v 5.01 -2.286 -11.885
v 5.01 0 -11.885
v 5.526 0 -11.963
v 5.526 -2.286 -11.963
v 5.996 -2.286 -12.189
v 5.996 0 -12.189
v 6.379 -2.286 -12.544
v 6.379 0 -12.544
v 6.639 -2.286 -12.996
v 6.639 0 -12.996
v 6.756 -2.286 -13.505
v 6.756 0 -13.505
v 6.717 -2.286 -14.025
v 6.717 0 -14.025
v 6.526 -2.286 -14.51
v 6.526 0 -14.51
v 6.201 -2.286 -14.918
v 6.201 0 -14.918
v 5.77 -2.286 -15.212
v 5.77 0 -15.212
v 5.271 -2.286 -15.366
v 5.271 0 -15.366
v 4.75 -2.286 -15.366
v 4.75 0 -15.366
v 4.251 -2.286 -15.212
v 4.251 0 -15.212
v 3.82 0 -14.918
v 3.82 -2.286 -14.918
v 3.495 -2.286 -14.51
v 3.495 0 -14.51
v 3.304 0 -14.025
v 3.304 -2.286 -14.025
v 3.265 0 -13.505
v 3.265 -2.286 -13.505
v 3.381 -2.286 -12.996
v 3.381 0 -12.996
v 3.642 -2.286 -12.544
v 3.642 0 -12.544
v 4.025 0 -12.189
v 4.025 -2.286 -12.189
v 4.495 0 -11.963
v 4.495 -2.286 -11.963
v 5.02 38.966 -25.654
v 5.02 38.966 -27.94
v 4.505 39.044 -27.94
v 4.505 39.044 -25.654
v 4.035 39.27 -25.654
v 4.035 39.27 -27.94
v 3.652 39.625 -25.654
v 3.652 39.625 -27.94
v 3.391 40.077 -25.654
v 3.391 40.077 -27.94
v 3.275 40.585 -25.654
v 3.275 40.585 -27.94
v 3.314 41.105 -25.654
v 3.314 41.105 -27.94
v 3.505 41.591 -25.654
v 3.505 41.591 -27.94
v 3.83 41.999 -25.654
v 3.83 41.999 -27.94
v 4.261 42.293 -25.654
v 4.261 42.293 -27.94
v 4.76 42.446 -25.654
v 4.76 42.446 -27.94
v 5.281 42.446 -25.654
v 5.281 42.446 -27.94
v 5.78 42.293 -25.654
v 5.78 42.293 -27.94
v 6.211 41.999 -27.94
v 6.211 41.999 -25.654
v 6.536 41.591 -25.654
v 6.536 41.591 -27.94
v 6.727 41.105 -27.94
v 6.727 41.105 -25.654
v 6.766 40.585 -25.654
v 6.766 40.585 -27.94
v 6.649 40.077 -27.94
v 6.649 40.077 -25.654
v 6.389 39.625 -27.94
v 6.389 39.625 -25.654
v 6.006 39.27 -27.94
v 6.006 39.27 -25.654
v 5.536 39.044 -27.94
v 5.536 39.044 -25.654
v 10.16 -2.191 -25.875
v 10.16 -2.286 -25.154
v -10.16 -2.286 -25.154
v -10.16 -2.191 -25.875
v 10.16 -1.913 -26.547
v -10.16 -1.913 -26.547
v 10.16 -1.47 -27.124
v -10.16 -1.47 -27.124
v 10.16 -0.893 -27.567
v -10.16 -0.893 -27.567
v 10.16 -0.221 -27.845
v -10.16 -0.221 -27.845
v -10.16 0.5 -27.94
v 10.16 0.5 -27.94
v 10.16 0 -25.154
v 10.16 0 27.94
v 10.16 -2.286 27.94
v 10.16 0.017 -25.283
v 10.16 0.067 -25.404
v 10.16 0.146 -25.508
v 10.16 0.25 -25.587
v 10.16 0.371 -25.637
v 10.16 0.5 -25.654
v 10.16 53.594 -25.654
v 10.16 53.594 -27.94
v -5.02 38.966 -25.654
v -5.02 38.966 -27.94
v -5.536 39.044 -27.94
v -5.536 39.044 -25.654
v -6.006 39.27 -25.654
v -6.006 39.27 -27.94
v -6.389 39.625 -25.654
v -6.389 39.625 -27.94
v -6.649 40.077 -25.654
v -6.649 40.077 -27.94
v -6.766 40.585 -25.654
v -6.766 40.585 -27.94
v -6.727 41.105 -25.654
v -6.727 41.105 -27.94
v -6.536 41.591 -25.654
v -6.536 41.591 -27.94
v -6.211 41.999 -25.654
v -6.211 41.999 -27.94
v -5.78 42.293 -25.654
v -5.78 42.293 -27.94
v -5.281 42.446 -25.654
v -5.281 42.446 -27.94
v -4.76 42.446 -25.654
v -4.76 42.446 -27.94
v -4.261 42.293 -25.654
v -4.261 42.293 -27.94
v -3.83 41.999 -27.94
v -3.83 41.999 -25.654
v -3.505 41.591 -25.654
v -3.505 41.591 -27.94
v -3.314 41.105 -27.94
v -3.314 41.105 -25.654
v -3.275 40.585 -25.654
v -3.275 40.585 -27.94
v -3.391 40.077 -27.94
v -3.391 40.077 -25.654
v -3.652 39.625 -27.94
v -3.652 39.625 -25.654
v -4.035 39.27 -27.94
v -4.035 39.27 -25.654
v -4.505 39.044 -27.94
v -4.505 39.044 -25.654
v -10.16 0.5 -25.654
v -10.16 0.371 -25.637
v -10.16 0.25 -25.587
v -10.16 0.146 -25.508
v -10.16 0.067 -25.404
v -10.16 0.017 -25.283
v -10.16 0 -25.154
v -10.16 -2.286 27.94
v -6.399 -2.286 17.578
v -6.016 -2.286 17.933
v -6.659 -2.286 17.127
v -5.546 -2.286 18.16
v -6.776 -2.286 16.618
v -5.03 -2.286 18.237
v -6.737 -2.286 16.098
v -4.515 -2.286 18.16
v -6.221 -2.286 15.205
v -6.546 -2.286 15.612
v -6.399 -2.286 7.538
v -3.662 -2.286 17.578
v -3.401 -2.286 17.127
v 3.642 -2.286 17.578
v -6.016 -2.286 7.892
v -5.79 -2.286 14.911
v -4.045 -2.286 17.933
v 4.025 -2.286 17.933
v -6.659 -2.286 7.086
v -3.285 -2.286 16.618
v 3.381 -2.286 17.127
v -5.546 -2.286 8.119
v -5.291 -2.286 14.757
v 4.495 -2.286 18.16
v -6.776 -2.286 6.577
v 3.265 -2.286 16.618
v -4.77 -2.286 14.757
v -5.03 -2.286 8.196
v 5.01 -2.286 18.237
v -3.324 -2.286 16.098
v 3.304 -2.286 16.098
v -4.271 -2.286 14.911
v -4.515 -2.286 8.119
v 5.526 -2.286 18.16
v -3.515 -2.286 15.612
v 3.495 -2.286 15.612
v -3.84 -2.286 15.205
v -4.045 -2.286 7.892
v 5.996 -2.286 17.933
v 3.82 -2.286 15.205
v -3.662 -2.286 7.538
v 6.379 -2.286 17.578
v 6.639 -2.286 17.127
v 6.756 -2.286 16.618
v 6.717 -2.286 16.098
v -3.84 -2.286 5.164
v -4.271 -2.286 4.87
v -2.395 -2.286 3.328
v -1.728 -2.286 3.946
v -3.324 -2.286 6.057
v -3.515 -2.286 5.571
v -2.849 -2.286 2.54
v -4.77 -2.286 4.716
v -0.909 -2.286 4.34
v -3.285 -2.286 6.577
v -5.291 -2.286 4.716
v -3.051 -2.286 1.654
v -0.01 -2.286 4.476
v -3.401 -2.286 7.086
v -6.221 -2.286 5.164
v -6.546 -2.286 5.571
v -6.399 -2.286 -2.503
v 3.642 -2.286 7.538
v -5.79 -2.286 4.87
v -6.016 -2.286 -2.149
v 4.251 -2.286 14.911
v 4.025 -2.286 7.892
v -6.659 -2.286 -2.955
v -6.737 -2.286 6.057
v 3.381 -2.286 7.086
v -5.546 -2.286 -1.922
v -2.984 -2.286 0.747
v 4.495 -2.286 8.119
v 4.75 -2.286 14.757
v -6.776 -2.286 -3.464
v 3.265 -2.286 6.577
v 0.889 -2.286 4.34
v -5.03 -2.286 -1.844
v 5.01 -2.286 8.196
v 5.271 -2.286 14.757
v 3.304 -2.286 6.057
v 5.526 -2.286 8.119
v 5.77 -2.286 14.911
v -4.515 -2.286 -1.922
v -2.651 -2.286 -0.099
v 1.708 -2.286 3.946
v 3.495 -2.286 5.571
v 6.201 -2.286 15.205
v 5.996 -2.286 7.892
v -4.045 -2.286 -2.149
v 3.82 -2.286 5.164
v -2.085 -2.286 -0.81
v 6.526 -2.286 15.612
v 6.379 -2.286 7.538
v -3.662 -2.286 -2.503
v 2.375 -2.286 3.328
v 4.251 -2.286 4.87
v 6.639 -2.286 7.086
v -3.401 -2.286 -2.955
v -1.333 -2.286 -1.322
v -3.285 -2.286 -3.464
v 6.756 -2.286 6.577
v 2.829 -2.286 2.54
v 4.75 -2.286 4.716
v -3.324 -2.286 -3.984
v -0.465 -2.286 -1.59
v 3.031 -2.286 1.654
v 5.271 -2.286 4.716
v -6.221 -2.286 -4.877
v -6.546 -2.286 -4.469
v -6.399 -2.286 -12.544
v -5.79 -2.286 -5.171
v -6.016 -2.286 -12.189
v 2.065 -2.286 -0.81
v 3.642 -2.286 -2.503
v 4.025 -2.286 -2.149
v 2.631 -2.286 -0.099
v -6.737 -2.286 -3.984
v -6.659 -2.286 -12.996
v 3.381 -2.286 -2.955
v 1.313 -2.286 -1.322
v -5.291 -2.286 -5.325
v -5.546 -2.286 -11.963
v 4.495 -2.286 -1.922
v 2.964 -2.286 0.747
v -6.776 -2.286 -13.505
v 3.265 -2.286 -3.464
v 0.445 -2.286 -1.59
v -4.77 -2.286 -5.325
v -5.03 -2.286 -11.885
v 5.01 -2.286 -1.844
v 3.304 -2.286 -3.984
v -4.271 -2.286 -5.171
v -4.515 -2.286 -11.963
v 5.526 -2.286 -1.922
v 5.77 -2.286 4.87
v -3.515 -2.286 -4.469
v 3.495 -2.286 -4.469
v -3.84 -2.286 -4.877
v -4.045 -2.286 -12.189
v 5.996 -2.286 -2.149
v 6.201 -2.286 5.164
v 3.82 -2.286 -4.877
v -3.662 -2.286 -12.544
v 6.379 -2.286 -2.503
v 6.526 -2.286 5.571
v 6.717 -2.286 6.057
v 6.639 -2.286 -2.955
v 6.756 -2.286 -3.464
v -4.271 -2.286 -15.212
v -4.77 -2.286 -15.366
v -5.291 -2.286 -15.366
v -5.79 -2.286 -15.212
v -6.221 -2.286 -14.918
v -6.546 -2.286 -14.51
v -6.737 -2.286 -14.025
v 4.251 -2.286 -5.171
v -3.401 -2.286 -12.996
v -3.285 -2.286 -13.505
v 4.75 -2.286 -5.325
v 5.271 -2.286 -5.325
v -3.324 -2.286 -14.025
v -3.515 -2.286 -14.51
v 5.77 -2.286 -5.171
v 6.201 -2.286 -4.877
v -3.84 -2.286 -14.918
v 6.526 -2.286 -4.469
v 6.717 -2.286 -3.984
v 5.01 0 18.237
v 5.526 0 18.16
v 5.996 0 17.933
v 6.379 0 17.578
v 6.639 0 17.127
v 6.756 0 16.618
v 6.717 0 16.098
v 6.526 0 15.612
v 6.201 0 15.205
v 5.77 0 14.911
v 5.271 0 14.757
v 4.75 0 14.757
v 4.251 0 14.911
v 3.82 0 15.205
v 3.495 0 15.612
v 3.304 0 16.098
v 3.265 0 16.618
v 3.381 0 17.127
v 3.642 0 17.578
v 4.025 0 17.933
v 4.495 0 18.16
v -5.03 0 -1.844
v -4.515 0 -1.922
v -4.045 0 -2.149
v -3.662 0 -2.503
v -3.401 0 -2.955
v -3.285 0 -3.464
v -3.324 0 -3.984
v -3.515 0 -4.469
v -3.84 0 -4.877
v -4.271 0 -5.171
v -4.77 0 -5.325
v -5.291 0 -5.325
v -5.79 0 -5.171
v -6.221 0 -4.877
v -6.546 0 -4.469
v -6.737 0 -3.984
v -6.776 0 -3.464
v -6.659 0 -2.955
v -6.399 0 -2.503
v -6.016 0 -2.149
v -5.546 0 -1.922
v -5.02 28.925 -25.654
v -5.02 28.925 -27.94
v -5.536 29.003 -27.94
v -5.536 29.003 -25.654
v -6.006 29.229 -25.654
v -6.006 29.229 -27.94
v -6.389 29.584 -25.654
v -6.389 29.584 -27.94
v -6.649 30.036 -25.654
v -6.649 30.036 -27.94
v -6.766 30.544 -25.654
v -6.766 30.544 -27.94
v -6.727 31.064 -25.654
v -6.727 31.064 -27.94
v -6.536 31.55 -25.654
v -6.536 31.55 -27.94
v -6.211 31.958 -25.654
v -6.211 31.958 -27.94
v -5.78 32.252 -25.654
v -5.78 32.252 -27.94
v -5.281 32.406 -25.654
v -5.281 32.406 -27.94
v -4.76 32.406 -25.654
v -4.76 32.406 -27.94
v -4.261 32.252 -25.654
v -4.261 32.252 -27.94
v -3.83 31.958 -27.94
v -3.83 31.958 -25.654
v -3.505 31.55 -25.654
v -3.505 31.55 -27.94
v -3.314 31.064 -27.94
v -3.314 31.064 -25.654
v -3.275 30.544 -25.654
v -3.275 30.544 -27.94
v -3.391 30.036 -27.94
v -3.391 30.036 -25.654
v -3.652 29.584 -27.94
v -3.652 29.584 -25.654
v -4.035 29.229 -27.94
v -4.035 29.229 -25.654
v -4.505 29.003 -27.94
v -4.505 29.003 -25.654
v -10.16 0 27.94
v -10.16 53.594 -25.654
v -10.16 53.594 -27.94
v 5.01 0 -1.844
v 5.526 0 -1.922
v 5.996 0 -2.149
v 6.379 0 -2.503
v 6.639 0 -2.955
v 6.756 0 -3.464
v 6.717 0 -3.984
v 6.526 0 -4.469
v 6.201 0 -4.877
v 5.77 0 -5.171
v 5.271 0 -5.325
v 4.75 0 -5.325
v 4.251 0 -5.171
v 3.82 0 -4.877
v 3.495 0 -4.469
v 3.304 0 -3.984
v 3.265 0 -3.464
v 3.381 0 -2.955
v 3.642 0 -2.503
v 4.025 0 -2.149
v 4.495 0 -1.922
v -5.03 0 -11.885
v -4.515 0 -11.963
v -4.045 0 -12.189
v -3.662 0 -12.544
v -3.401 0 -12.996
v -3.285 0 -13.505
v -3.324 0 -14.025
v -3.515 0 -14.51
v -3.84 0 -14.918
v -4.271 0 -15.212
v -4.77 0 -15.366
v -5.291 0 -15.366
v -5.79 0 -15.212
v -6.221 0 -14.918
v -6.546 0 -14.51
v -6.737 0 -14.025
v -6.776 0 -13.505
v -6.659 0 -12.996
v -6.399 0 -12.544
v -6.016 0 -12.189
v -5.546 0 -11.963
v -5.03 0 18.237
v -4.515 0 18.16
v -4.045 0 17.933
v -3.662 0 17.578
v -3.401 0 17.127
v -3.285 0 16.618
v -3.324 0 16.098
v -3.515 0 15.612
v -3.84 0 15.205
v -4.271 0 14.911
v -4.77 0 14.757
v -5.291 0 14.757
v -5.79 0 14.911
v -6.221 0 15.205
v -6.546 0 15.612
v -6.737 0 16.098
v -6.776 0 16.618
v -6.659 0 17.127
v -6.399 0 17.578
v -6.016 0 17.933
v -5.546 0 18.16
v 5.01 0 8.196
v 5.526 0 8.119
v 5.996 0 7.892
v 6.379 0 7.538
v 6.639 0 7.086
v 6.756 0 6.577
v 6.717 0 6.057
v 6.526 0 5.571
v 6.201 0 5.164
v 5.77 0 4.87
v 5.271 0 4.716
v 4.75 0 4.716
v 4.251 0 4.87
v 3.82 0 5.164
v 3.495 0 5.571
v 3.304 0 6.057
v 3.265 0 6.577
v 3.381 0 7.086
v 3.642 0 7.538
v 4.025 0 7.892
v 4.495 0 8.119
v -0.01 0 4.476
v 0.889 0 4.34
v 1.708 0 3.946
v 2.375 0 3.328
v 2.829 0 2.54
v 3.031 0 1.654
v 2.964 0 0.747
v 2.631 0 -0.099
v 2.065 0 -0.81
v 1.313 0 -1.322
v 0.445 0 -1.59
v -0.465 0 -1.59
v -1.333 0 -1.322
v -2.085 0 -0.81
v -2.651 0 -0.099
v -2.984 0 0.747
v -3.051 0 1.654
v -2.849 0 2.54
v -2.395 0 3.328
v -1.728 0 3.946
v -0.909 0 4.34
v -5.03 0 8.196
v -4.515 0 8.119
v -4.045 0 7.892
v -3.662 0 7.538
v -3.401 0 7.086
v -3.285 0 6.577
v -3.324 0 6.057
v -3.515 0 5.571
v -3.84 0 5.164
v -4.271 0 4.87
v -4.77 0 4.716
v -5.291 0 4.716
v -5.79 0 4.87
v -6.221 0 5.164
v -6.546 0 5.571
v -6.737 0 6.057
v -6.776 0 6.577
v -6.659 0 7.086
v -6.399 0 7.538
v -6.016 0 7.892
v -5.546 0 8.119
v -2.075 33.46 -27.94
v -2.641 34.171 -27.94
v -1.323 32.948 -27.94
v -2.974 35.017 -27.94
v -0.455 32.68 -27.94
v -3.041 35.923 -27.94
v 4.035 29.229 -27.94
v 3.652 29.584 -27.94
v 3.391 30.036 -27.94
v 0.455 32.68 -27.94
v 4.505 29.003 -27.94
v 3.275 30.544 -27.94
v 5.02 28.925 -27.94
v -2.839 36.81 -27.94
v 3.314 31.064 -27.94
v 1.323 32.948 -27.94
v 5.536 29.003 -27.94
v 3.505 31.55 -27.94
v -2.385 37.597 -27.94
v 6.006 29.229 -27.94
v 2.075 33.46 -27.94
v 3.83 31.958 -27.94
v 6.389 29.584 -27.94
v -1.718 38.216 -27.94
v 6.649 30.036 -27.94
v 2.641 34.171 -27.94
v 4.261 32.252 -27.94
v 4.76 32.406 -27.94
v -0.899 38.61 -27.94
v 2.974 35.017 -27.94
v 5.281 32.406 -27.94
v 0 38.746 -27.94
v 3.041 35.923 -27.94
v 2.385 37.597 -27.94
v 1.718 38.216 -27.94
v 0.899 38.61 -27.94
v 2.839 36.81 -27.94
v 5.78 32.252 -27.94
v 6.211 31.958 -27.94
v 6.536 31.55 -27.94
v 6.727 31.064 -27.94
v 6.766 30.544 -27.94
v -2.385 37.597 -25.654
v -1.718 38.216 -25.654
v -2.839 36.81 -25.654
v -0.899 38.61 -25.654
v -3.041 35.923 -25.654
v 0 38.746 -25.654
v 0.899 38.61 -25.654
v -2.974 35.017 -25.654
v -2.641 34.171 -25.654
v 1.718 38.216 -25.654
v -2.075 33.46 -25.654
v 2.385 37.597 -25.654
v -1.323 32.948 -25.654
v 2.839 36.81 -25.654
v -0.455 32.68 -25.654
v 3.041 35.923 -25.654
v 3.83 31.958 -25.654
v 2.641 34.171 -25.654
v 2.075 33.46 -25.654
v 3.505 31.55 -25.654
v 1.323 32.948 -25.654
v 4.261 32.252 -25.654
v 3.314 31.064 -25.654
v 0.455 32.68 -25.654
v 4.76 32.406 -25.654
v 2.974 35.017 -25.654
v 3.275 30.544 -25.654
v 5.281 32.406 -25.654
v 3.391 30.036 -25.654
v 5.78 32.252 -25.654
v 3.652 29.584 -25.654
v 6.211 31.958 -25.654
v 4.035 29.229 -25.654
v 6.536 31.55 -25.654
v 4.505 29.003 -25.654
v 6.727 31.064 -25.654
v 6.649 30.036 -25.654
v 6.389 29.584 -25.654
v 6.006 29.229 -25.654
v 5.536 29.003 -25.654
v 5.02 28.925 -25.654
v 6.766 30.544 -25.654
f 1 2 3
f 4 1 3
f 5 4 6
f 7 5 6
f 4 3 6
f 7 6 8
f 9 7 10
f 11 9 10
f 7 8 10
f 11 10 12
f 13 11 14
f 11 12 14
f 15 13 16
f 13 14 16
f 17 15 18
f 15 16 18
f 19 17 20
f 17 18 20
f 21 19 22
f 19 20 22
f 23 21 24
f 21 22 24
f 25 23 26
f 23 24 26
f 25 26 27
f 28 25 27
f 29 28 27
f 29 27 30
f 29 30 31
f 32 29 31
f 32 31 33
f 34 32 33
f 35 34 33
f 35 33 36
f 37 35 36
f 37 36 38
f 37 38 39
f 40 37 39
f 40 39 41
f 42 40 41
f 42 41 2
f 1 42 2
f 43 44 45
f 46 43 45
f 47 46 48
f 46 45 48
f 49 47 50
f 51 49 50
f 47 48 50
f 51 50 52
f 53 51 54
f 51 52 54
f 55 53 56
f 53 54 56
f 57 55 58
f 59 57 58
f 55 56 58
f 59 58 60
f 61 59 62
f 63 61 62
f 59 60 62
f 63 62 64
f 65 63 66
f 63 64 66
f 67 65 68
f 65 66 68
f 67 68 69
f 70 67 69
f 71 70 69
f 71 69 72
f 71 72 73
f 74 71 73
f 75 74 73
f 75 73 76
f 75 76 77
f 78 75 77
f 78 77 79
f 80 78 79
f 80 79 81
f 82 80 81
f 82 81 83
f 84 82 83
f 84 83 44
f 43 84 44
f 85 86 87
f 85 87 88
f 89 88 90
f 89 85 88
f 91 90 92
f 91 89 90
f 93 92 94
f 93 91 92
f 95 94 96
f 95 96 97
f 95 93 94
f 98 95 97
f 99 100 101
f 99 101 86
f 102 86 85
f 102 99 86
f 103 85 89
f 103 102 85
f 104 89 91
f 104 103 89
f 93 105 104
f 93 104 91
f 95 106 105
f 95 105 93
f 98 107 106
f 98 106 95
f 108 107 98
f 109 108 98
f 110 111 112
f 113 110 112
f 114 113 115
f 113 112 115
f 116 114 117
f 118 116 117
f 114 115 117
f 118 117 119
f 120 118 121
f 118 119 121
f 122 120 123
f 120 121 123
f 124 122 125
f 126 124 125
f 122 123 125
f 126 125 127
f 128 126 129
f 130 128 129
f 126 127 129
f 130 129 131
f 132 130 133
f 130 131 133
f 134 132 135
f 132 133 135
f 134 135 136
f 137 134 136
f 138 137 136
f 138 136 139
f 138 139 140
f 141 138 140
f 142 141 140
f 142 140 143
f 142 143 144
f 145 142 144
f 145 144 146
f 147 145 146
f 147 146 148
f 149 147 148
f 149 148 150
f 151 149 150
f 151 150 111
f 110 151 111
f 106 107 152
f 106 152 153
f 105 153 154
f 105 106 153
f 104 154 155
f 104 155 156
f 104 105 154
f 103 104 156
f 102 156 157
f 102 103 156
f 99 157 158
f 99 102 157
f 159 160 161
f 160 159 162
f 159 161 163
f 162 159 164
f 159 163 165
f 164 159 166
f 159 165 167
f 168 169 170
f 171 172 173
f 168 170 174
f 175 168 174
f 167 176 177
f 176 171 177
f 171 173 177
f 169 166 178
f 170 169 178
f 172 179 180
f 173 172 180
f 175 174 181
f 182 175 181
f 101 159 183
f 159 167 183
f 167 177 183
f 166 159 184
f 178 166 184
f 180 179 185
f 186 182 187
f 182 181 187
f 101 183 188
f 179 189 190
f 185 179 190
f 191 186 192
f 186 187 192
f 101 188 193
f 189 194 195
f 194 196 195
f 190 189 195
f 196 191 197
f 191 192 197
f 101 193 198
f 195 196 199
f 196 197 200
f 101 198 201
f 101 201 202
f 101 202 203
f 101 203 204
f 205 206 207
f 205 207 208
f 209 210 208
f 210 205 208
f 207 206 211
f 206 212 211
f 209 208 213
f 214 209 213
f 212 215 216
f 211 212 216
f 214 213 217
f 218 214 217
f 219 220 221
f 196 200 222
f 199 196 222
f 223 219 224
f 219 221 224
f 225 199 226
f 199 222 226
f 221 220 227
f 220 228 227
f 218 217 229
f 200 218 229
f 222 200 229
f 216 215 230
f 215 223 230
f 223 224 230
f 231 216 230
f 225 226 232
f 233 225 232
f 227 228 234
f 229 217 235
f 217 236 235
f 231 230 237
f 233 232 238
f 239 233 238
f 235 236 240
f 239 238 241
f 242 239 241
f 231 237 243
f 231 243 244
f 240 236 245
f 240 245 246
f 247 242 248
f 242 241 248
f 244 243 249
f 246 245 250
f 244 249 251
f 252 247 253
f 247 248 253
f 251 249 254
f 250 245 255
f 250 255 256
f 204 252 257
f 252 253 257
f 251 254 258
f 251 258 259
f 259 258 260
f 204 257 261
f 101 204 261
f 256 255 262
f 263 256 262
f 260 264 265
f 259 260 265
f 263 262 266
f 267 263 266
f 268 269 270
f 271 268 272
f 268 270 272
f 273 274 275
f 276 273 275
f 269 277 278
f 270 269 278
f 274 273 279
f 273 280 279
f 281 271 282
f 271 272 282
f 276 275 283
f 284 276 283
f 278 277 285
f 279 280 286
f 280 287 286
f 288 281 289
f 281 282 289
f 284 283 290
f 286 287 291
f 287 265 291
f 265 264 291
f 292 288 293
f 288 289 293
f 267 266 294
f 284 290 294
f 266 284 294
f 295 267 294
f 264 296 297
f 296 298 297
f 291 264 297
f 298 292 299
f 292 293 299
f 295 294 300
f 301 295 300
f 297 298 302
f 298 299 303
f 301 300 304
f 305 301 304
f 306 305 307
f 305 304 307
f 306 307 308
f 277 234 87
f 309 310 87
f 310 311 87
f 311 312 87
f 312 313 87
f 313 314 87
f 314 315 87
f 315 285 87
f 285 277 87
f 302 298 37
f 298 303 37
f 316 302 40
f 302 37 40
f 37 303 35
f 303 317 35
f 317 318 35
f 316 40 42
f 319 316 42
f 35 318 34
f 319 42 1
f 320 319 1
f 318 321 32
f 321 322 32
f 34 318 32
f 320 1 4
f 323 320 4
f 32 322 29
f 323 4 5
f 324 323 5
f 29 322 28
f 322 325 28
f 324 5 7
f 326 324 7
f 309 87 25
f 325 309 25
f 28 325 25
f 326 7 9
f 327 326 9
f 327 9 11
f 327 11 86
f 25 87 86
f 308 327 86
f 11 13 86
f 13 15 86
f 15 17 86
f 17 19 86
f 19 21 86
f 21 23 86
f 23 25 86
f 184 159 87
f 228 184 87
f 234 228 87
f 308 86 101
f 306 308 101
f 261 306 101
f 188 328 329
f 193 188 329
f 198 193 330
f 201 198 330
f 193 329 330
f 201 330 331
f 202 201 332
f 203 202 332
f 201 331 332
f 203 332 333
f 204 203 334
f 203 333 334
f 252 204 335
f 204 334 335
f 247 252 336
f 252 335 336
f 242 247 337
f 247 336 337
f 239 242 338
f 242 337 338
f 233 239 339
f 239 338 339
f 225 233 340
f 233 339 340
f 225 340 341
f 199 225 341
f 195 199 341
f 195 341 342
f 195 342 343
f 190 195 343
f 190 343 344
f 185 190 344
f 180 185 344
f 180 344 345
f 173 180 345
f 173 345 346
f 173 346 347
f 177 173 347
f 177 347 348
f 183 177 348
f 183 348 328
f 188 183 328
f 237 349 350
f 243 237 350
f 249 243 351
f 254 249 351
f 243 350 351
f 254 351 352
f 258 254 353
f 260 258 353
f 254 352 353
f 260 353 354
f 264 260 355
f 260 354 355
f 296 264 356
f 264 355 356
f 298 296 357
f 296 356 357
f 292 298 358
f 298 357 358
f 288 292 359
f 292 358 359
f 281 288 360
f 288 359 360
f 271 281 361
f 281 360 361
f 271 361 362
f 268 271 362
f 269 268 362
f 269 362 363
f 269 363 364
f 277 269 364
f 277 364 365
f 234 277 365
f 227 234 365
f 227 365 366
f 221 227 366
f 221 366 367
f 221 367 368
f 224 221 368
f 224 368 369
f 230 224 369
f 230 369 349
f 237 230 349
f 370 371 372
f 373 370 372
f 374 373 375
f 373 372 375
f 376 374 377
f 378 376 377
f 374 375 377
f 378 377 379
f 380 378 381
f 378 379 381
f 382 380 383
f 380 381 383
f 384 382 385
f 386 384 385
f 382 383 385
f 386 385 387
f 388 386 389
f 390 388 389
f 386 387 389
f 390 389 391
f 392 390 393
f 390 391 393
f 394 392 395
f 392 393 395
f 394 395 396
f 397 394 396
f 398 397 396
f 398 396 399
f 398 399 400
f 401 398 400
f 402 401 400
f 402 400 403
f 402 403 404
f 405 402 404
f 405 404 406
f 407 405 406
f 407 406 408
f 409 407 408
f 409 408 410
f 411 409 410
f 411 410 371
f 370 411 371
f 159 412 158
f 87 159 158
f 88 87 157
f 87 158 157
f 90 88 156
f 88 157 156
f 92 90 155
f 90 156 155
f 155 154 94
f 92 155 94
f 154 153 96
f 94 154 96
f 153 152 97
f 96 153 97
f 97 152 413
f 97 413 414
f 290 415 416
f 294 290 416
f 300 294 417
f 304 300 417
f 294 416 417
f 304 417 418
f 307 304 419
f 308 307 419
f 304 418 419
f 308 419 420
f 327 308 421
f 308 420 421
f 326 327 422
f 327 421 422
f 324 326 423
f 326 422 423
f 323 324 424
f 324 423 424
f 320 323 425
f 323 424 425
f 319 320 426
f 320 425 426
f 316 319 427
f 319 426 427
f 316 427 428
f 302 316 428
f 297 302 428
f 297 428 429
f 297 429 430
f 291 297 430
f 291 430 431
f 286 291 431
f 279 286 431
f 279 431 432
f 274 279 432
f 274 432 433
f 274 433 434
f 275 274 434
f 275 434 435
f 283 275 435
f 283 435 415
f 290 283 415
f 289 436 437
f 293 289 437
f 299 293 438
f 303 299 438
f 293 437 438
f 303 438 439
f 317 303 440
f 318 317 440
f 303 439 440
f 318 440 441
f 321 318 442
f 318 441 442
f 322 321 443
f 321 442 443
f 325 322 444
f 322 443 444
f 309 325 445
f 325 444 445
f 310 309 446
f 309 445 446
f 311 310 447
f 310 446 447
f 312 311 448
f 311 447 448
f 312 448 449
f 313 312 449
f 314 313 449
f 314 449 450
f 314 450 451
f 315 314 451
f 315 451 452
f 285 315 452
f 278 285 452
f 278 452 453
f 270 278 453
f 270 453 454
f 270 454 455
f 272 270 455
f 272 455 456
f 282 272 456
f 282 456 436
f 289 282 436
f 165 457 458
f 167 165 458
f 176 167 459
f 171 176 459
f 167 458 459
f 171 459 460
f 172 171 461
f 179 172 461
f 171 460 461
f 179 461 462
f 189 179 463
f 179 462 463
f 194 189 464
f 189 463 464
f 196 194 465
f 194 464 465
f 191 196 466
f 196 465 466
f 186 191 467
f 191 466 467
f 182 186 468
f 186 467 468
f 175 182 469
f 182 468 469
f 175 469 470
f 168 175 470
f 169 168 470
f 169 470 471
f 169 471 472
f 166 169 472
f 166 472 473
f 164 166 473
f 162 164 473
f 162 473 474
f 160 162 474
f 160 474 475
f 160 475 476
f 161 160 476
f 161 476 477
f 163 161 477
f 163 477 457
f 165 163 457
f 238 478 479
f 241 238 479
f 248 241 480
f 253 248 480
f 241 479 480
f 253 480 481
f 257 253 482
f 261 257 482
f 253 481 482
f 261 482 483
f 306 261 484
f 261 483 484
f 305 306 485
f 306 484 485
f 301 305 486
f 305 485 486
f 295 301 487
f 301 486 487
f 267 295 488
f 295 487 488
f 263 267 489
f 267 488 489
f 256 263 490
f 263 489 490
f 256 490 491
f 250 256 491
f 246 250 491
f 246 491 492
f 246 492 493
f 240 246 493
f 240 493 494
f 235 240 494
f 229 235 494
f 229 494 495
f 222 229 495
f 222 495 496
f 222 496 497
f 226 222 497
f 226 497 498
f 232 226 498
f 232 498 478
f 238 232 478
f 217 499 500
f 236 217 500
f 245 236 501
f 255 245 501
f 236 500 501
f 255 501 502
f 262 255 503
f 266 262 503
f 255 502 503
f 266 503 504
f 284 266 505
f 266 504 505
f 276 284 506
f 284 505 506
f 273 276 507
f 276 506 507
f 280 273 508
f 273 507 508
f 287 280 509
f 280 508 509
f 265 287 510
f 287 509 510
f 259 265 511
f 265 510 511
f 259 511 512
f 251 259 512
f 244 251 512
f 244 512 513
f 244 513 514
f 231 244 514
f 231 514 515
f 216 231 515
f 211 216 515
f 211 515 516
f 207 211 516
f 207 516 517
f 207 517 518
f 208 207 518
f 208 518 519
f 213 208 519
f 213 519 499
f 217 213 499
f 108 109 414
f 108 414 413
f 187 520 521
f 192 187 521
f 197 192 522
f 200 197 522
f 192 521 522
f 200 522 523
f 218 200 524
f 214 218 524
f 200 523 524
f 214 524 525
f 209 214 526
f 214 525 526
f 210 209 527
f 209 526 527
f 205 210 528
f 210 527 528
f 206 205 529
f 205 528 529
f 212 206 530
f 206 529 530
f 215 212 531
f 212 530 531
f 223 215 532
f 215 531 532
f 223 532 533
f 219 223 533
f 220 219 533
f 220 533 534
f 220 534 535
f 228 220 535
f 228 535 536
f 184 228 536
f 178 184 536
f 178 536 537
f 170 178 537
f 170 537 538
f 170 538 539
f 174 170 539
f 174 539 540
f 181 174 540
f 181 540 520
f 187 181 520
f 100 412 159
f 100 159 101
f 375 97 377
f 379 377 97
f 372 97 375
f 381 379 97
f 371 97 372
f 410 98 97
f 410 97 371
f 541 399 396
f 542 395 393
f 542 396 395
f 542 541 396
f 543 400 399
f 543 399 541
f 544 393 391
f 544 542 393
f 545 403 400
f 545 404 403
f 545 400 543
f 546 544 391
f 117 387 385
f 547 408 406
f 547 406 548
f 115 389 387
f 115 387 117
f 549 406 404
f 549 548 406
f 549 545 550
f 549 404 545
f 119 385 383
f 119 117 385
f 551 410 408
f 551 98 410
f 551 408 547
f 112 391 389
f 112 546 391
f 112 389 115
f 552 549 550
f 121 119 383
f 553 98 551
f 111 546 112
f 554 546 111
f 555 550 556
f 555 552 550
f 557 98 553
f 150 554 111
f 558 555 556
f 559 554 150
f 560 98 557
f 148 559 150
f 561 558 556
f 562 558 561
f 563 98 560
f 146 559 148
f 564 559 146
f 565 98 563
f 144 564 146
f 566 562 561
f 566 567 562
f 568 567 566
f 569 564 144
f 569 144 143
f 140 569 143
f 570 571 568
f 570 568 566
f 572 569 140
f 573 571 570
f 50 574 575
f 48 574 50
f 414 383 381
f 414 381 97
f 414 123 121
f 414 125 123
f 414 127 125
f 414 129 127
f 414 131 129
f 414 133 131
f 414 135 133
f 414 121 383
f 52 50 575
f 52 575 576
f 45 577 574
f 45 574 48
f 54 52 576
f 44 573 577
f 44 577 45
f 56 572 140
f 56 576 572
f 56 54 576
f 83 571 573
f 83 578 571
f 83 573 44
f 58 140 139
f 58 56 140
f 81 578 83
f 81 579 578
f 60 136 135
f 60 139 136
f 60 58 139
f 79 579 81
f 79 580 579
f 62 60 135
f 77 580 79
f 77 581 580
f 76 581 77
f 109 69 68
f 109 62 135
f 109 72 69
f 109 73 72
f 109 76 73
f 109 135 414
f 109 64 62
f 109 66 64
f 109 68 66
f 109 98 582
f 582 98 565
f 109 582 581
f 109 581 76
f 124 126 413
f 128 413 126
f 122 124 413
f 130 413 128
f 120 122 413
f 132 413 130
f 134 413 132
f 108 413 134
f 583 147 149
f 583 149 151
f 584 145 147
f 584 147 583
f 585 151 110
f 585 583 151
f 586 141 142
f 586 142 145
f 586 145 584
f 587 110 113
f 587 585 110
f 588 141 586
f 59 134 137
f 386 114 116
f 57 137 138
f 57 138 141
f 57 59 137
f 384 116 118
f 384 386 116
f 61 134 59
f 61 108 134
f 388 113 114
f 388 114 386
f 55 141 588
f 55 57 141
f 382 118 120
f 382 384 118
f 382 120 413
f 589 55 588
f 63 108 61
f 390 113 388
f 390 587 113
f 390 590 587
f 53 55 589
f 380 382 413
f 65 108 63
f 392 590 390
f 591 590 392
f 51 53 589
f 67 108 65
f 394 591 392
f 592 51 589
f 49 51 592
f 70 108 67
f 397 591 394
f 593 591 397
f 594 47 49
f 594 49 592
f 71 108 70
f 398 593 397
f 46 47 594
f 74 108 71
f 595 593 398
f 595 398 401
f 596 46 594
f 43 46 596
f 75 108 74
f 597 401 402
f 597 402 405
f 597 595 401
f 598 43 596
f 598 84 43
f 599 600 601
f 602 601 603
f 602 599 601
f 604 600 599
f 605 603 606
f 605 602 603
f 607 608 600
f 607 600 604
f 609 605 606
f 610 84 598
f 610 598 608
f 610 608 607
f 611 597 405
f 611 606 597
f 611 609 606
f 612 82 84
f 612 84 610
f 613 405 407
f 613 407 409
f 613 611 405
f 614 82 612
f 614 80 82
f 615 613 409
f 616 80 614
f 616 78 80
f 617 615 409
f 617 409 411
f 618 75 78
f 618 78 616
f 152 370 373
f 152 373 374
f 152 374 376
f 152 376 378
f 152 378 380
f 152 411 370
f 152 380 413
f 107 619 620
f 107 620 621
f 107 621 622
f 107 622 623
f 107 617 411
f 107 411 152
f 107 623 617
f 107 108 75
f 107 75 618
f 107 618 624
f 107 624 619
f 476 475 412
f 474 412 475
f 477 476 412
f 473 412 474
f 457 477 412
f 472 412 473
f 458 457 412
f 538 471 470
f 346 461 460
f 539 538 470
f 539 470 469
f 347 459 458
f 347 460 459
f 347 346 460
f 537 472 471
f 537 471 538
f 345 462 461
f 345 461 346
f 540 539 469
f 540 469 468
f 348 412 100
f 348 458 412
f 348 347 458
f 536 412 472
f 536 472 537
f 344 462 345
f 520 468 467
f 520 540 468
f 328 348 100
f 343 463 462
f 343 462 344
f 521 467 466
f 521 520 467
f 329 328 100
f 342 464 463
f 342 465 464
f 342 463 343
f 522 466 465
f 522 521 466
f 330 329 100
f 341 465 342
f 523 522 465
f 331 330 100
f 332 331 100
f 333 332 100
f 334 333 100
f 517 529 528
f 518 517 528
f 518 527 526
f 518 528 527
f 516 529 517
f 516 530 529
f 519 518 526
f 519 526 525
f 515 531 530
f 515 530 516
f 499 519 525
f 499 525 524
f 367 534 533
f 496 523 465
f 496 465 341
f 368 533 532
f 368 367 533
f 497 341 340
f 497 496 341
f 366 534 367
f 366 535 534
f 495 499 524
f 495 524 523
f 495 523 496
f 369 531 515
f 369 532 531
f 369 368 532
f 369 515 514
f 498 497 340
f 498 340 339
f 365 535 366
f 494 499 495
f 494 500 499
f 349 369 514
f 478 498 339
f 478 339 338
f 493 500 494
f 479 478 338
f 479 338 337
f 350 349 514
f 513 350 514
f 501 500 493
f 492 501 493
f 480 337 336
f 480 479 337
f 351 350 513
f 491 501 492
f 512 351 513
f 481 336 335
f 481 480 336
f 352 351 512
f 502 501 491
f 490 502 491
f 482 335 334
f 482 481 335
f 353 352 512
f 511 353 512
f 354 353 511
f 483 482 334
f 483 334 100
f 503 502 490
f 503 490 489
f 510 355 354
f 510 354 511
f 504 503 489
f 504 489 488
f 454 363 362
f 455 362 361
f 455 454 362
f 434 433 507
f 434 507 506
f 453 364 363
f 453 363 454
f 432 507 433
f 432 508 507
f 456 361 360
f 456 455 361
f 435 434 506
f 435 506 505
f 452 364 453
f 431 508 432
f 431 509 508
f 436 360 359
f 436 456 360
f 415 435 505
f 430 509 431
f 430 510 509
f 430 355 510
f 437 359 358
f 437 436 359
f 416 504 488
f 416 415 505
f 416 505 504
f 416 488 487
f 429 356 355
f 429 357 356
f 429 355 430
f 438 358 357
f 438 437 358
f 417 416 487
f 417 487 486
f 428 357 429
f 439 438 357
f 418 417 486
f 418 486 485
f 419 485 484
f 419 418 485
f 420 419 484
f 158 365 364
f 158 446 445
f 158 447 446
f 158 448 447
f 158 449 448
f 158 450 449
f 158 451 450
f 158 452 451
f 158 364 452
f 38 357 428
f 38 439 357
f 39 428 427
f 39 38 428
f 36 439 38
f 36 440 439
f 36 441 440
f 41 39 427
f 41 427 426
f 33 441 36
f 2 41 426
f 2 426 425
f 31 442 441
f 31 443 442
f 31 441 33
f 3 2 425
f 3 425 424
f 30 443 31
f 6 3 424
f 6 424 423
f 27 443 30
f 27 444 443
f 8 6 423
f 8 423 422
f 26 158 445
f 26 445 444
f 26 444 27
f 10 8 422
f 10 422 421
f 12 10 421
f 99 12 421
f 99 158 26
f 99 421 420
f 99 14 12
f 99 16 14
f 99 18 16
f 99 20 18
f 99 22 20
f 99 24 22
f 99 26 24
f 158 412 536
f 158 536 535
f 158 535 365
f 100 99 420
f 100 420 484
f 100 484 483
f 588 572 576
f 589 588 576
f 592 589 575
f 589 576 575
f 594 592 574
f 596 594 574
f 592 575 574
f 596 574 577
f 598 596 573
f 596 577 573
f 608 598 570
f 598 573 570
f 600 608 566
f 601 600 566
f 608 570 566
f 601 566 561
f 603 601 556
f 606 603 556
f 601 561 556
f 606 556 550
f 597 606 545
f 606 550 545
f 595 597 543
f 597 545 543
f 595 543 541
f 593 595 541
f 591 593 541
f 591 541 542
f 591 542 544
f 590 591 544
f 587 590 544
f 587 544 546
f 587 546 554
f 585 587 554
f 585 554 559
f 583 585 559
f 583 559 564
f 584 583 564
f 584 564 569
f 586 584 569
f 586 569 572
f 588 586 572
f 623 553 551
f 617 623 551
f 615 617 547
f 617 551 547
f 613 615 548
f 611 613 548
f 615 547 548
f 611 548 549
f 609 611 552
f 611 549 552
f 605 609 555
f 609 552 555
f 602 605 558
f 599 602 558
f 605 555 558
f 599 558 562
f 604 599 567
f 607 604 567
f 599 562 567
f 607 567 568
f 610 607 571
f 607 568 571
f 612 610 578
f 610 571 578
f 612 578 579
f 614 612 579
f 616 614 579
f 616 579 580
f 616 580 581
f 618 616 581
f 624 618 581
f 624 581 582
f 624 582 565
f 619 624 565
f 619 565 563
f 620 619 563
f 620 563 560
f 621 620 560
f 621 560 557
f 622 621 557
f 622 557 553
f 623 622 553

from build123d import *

# Parameters (mm, degrees)
SKETCH1_W                    = 20.32
SKETCH1_H                    = 55.88
BASE_FLANGE1_DEPTH           = 2.286
EDGE_FLANGE1_STRIP_W         = 10.144
EDGE_FLANGE1_STRIP_H         = 2.286
EDGE_FLANGE1_STRIP_CUT_DEPTH = 20.32
EDGE_FLANGE1_DEPTH           = 20.32
SKETCH9_R                    = 3.05
CUT_EXTRUDE1_DEPTH           = 79.090440106
SKETCH10_R                   = 3.05
SKETCH10_R_2                 = 1.75
CUT_EXTRUDE2_DEPTH           = 62.287731529


# Sheet-metal steps are written as plain solids
with BuildPart() as part:
    # Sketch1 → Base-Flange1 (new body)
    with BuildSketch(Plane(origin=(0, 0, 0), x_dir=(1, 0, 0), z_dir=(0, 1, 0))):
        Rectangle(SKETCH1_W, SKETCH1_H)
    extrude(amount=-BASE_FLANGE1_DEPTH)

    # Edge-Flange1 strip (across the edge) → Edge-Flange1 strip cut (cut)
    with BuildSketch(Plane(origin=(10.16, 0, -27.94), x_dir=(0, 0, 1), z_dir=(-1, 0, 0))):
        with Locations((-2.286, -1.143)):
            Rectangle(EDGE_FLANGE1_STRIP_W, EDGE_FLANGE1_STRIP_H)
    extrude(amount=EDGE_FLANGE1_STRIP_CUT_DEPTH, mode=Mode.SUBTRACT)

    # Edge-Flange1 section (across the edge) → Edge-Flange1 (add)
    with BuildSketch(Plane(origin=(10.16, 0, -27.94), x_dir=(0, 0, 1), z_dir=(-1, 0, 0))):
        with BuildLine():
            Line((0, 0.5), (0, 53.594))
            Line((0, 53.594), (2.286, 53.594))
            Line((2.286, 53.594), (2.286, 0.5))
            ThreePointArc((2.286, 0.5), (2.432446609, 0.146446609), (2.786, 0))
            Line((2.786, 0), (2.786, -2.286))
            ThreePointArc((2.786, -2.286), (0.816000508, -1.469999492), (0, 0.5))
        make_face()
    extrude(amount=EDGE_FLANGE1_DEPTH)

    # Sketch9 → Cut-Extrude1 (cut, through all)
    with BuildSketch(Plane(origin=(0, 0, -27.94), x_dir=(-1, 0, 0), z_dir=(0, 0, -1))):
        with Locations(Location((0, 35.695518005, 0), (0, 0, 90))):
            Circle(SKETCH9_R)
        with BuildLine():
            ThreePointArc((-5.020458146, 42.465976152), (-6.770458146, 40.715976152), (-5.020458146, 38.965976152))
            ThreePointArc((-5.020458146, 38.965976152), (-3.270458146, 40.715976152), (-5.020458146, 42.465976152))
        make_face()
        with BuildLine():
            ThreePointArc((-5.020458146, 32.425059859), (-6.770458146, 30.675059859), (-5.020458146, 28.925059859))
            ThreePointArc((-5.020458146, 28.925059859), (-3.270458146, 30.675059859), (-5.020458146, 32.425059859))
        make_face()
        with BuildLine():
            ThreePointArc((5.020458146, 32.425059859), (3.270458146, 30.675059859), (5.020458146, 28.925059859))
            ThreePointArc((5.020458146, 28.925059859), (6.770458146, 30.675059859), (5.020458146, 32.425059859))
        make_face()
        with BuildLine():
            ThreePointArc((5.020458146, 42.465976152), (3.270458146, 40.715976152), (5.020458146, 38.965976152))
            ThreePointArc((5.020458146, 38.965976152), (6.770458146, 40.715976152), (5.020458146, 42.465976152))
        make_face()
    extrude(amount=-CUT_EXTRUDE1_DEPTH, mode=Mode.SUBTRACT)

    # Sketch10 → Cut-Extrude2 (cut, through all)
    with BuildSketch(Plane(origin=(0, 0, 0), x_dir=(1, 0, 0), z_dir=(0, 1, 0))):
        with Locations(Location((-0.01000002, -1.426000002, 0), (0, 0, 270))):
            Circle(SKETCH10_R)
        with Locations(Location((-5.030458167, -16.487374441, 0), (0, 0, 270))):
            Circle(SKETCH10_R_2)
        with Locations(Location((-5.030458167, 3.594458144, 0), (0, 0, 270))):
            Circle(SKETCH10_R_2)
        with Locations(Location((5.010458126, 13.635374437, 0), (0, 0, 270))):
            Circle(SKETCH10_R_2)
        with Locations(Location((5.010458126, -6.446458149, 0), (0, 0, 270))):
            Circle(SKETCH10_R_2)
        with Locations(Location((5.010458126, -16.487374441, 0), (0, 0, 270))):
            Circle(SKETCH10_R_2)
        with Locations(Location((-5.030458167, 13.635374437, 0), (0, 0, 270))):
            Circle(SKETCH10_R_2)
        with Locations(Location((-5.030458167, -6.446458149, 0), (0, 0, 270))):
            Circle(SKETCH10_R_2)
        with Locations(Location((5.010458126, 3.594458144, 0), (0, 0, 270))):
            Circle(SKETCH10_R_2)
    extrude(amount=-CUT_EXTRUDE2_DEPTH, mode=Mode.SUBTRACT)


solid = part.part
